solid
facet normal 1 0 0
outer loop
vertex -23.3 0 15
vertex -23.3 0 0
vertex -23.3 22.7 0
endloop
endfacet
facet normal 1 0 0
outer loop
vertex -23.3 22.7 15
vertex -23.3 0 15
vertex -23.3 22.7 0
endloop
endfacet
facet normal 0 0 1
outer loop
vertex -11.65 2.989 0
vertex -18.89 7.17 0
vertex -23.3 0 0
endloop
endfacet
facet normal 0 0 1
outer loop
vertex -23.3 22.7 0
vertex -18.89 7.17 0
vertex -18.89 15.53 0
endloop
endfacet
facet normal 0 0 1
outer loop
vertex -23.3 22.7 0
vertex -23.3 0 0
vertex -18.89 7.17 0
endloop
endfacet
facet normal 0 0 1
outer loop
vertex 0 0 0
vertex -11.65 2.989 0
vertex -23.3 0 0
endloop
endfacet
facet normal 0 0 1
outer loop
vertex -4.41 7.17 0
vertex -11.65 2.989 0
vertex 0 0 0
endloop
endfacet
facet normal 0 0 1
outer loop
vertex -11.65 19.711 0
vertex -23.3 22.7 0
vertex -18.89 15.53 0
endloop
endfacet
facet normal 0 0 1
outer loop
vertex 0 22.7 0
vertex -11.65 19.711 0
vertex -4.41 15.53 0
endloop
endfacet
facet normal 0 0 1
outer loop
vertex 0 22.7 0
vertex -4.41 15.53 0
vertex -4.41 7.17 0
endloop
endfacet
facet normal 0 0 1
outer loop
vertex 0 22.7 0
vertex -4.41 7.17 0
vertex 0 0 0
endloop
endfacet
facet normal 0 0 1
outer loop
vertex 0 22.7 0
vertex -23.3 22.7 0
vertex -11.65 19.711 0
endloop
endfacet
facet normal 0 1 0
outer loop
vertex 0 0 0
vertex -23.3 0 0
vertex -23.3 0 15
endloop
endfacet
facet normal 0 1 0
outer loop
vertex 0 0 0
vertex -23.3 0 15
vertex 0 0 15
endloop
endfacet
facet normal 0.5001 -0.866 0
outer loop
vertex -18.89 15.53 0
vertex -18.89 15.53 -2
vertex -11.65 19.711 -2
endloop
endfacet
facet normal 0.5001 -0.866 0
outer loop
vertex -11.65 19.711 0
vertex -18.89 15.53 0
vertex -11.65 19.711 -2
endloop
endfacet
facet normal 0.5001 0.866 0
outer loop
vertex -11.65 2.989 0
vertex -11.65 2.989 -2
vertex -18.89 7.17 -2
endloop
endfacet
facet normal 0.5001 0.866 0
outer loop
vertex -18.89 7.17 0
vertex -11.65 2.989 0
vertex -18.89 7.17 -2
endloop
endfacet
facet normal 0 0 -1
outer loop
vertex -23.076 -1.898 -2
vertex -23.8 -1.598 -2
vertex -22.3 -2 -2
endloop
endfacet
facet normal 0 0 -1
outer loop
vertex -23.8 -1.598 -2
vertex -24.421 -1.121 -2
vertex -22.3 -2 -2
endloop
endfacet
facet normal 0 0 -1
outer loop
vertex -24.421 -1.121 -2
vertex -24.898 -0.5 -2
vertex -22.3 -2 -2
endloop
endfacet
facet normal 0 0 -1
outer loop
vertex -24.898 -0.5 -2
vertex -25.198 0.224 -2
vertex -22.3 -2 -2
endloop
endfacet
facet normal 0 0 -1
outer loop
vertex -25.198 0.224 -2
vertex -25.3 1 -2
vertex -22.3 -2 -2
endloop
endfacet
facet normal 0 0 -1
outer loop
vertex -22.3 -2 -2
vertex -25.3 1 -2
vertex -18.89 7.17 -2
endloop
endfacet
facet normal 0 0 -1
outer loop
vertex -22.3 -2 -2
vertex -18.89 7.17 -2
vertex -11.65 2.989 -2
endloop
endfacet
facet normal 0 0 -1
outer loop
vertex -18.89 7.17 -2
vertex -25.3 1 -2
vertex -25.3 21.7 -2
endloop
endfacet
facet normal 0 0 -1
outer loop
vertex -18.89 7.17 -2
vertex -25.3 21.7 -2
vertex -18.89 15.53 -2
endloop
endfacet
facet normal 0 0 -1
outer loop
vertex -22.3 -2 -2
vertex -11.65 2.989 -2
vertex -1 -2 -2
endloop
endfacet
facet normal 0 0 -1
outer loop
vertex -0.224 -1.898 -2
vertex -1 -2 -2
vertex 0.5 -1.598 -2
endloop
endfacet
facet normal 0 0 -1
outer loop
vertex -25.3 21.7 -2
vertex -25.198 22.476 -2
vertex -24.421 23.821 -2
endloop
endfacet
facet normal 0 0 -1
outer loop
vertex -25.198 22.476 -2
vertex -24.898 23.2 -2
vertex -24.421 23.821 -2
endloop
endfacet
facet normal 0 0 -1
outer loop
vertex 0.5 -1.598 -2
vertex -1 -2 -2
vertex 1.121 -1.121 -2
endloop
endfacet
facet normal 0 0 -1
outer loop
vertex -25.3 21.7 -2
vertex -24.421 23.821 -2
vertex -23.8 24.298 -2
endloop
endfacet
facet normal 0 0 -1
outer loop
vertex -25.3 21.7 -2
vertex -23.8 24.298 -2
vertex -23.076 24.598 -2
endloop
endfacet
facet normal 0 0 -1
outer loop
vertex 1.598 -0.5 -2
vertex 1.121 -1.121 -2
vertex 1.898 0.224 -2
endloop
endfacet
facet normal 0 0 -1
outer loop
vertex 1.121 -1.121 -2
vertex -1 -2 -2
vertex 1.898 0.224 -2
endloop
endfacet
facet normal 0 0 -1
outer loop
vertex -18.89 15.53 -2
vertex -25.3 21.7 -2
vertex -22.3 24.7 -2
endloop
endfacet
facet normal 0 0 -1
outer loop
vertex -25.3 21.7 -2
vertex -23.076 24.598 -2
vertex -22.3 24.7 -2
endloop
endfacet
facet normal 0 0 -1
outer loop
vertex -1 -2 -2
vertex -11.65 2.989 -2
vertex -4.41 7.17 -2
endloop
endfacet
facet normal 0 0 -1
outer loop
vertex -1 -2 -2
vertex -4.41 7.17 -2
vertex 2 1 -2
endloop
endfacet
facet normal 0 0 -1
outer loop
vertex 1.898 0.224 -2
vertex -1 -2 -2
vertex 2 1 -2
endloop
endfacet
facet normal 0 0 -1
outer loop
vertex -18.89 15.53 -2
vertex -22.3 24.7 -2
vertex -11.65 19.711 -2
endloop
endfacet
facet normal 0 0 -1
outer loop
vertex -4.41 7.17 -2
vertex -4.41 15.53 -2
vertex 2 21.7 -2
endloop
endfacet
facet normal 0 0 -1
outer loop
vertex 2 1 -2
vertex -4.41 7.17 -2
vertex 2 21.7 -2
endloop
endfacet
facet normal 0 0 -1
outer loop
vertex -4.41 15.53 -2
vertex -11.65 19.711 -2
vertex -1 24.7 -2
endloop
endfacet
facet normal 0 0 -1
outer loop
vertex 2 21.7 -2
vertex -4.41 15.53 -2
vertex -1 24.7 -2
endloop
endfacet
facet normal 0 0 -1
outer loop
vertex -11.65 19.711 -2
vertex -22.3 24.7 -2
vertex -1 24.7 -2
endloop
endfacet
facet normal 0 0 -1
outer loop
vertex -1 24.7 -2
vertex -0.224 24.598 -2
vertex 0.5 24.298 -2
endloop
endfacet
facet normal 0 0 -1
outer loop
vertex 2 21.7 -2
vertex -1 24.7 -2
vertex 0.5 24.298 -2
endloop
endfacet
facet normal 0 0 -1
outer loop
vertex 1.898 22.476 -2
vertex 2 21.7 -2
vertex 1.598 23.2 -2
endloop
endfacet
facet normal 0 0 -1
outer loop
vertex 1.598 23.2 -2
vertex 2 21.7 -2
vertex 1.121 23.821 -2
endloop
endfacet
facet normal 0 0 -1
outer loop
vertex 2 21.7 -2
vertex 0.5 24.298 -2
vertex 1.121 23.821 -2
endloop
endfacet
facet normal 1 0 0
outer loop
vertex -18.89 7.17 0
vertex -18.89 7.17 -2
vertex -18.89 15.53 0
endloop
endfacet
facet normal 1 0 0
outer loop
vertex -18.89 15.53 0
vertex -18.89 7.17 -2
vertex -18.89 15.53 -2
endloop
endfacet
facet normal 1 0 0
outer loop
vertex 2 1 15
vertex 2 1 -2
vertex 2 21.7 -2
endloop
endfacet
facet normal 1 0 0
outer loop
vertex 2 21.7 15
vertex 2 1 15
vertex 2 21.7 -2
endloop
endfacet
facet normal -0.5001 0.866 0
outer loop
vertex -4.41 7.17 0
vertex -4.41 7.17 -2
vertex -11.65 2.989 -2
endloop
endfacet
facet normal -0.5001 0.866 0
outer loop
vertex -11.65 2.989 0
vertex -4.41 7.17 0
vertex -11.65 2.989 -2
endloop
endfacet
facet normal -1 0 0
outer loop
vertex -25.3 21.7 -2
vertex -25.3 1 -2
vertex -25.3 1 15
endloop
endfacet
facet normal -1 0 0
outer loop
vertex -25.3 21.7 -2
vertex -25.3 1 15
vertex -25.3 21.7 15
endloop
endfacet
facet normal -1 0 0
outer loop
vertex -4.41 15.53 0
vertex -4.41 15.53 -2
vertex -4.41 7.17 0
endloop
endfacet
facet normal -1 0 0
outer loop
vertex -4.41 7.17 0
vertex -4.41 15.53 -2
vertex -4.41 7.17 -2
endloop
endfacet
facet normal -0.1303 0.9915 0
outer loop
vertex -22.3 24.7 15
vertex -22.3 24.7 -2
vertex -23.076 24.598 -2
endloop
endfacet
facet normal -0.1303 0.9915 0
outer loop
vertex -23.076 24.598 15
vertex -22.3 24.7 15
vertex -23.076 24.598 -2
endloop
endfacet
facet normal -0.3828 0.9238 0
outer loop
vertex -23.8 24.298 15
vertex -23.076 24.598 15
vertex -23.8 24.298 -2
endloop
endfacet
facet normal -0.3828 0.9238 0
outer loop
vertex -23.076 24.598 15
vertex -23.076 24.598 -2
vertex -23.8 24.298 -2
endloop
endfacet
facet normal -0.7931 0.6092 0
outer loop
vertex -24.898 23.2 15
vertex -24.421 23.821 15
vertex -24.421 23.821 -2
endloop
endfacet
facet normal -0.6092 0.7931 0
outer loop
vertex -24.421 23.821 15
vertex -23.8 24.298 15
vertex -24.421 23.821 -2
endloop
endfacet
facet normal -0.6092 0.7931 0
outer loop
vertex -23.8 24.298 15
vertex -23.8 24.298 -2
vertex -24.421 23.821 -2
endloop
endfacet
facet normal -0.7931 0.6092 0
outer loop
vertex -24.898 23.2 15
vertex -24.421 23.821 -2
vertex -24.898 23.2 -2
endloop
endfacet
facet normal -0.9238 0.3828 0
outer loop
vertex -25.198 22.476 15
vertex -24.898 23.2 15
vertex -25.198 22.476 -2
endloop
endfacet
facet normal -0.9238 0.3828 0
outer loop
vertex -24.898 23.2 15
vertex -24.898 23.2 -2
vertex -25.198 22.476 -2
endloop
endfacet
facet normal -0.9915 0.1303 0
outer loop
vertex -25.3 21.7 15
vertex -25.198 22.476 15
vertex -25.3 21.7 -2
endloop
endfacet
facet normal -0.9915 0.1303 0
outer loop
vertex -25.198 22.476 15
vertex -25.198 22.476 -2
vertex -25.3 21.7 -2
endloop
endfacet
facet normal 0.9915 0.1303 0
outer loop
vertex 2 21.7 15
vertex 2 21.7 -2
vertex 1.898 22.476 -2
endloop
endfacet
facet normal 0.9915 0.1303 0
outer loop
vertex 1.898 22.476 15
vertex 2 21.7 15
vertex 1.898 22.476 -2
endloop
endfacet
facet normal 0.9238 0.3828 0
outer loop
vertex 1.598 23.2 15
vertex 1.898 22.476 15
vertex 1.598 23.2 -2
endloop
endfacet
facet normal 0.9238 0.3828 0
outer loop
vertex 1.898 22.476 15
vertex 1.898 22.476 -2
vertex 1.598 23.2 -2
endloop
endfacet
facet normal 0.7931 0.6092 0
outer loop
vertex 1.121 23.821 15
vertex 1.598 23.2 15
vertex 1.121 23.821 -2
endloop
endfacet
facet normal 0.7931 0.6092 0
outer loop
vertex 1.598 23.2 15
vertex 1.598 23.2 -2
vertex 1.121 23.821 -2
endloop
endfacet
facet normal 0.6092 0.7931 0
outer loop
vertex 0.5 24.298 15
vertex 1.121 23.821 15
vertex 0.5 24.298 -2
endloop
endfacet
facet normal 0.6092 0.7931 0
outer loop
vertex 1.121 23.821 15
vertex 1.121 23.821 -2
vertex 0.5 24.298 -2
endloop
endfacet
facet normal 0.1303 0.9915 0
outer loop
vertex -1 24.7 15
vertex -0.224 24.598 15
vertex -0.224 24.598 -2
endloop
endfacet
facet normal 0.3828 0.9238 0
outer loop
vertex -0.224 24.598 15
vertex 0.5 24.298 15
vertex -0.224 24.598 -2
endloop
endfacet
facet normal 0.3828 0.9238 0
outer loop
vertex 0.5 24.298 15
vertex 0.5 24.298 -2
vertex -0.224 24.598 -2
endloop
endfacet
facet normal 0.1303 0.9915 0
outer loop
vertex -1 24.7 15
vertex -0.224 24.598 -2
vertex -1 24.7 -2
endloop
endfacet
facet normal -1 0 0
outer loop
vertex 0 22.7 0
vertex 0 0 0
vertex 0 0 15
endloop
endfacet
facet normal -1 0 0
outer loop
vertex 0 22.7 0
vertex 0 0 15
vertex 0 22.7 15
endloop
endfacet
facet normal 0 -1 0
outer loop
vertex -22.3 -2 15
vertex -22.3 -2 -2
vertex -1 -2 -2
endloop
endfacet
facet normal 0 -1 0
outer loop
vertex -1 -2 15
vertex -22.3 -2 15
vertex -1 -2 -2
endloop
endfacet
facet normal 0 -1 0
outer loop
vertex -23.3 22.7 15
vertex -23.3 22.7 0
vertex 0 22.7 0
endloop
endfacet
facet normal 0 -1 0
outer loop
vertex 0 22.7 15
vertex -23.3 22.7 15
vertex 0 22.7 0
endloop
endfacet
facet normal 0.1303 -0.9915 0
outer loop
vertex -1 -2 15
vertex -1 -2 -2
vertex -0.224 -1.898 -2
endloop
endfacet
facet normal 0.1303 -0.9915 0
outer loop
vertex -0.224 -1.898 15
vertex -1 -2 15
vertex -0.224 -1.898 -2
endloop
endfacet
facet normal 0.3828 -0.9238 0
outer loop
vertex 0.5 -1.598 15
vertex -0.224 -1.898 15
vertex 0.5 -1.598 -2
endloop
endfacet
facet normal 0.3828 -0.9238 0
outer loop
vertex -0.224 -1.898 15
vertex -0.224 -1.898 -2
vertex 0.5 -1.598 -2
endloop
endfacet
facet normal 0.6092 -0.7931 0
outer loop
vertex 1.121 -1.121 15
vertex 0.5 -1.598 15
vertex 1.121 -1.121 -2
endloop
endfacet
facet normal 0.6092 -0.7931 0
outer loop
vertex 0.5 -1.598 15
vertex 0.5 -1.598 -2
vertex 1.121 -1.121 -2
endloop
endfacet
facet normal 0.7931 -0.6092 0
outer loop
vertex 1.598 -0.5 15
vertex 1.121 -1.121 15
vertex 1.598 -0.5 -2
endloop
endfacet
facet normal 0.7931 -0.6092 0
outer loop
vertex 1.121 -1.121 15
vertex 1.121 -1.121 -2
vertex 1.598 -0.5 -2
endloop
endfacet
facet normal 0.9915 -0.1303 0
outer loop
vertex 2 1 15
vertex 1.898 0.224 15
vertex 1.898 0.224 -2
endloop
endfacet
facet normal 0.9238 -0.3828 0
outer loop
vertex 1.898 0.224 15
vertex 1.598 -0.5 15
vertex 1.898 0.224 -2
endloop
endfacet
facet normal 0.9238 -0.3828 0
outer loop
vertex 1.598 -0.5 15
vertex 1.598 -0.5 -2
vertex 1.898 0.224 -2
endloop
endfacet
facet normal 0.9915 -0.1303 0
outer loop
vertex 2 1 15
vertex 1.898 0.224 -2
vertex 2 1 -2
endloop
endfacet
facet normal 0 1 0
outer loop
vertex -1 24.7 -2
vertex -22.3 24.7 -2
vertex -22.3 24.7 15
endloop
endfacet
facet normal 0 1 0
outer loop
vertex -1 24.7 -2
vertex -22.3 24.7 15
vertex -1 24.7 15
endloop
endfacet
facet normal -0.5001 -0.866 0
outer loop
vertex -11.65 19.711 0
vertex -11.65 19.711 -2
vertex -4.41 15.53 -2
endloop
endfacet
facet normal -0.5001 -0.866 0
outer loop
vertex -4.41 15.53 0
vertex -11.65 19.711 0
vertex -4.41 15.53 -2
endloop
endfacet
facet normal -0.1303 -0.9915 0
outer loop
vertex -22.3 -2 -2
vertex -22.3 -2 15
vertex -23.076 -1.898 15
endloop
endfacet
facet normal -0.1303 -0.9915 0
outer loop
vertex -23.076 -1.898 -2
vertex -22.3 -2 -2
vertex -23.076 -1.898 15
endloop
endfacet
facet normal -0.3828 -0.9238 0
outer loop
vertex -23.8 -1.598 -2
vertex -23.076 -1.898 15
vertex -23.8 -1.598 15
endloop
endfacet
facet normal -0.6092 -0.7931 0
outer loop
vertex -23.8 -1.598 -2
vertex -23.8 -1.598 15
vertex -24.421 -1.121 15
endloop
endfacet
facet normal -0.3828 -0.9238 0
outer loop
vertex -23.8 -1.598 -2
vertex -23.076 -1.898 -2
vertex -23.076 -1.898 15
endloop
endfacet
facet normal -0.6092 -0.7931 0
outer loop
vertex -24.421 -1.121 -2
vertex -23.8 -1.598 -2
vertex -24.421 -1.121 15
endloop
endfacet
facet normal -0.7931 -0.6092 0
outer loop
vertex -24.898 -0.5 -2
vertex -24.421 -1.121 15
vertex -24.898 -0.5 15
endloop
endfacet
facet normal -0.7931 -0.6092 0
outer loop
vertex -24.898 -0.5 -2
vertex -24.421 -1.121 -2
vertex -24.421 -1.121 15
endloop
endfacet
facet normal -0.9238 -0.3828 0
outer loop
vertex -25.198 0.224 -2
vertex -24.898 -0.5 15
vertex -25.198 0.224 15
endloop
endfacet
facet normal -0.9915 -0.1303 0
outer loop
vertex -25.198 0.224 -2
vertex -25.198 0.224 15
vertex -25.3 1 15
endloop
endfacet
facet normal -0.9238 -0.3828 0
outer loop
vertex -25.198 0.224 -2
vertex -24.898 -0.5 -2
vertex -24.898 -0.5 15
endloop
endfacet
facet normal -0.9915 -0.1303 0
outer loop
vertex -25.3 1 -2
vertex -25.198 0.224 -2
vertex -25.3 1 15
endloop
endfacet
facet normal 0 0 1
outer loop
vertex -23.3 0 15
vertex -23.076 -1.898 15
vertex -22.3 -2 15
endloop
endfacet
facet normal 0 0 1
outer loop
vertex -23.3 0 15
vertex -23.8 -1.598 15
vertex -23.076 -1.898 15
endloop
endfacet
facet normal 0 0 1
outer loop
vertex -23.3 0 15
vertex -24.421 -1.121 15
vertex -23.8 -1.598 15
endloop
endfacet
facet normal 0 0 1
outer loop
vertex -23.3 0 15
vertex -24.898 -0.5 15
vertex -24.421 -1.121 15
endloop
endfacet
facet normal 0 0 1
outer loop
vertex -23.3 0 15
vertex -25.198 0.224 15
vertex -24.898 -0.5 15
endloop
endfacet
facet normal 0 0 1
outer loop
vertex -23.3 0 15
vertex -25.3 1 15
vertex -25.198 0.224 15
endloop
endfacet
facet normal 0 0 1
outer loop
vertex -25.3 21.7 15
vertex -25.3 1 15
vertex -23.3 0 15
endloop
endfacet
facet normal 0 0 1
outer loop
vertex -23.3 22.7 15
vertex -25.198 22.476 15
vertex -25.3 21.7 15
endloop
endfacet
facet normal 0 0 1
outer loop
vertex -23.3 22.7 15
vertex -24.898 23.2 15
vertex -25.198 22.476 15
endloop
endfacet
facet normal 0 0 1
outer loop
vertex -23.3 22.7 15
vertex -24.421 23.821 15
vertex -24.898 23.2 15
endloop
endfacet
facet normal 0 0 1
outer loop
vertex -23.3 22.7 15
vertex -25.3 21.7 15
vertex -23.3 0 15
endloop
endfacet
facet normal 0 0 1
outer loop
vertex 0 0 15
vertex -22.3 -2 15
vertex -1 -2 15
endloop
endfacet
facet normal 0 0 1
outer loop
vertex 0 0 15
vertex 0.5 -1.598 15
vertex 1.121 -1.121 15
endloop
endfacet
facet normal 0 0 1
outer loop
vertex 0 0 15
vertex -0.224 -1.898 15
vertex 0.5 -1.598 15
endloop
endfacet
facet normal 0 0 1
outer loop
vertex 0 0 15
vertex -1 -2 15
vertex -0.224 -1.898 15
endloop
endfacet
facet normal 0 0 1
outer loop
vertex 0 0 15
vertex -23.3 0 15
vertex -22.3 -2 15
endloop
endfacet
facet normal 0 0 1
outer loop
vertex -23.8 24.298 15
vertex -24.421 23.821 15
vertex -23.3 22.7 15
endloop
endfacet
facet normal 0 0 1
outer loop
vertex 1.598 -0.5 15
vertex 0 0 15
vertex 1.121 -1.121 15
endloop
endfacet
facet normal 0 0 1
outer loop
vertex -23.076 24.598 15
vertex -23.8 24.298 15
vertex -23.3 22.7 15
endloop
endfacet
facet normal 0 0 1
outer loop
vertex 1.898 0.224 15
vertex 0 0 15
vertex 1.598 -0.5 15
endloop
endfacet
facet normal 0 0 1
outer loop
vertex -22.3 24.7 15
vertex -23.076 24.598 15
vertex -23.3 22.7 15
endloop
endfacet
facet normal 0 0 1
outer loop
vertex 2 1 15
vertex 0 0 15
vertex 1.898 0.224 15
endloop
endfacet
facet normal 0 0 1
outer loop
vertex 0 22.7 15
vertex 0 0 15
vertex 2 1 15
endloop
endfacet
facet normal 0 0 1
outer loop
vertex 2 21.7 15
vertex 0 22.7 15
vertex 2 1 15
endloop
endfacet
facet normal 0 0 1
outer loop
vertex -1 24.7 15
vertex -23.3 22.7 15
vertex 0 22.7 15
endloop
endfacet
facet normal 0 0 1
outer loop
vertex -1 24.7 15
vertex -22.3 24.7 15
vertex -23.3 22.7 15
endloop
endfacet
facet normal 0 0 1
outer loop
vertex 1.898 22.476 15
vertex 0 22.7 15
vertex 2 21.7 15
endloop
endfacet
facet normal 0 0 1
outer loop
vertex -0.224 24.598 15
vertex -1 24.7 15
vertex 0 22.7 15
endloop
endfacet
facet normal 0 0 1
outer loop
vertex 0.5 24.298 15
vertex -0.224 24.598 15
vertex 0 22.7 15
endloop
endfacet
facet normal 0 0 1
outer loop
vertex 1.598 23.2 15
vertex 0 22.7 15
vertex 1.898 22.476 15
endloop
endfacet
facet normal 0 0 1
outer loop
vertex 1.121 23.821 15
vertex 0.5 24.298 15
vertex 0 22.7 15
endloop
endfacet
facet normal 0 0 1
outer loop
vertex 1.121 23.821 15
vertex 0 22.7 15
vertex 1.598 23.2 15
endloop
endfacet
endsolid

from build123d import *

# Parameters (mm, degrees)
F0_W        = 23.3
F0_H        = 22.7
F1_DEPTH    = 15
F2_T        = 2
F3_T1_DEPTH = 32
F5_DEPTH    = 25


# Not quite as in the source:
# - a fillet or chamfer that OpenCascade refuses, or shapes differently, is made with other operations: its cross-section is extruded or revolved along the edge and cut away or added


with BuildPart() as f1:
    # F0 (on Top) → F1 (new body)
    with BuildSketch(Plane.XY):
        with Locations((-11.65, 11.35)):
            Rectangle(F0_W, F0_H)
    extrude(amount=F1_DEPTH)

    # F2
    f2_openings = [f1.faces().sort_by_distance(p)[0] for p in [
        (-11.65, 11.35, 15),
    ]]
    offset(amount=F2_T, openings=f2_openings, kind=Kind.INTERSECTION)

    # F3: fillet of radius 3 on 4 edges, made by hand

    # F3_s2 → F3_t1 (cut)
    with BuildSketch(Plane.XY.offset(-9.5)):
        with BuildLine():
            ThreePointArc((-22.3, -2), (-24.4213203436, -1.1213203436), (-25.3, 1))
            Line((-25.3, 1), (-25.3, -2))
            Line((-25.3, -2), (-22.3, -2))
        make_face()
        with BuildLine():
            ThreePointArc((-1, -2), (1.1213203436, -1.1213203436), (2, 1))
            Line((2, 1), (2, -2))
            Line((2, -2), (-1, -2))
        make_face()
        with BuildLine():
            ThreePointArc((2, 21.7), (1.1213203436, 23.8213203436), (-1, 24.7))
            Line((-1, 24.7), (2, 24.7))
            Line((2, 24.7), (2, 21.7))
        make_face()
        with BuildLine():
            ThreePointArc((-22.3, 24.7), (-24.4213203436, 23.8213203436), (-25.3, 21.7))
            Line((-25.3, 21.7), (-25.3, 24.7))
            Line((-25.3, 24.7), (-22.3, 24.7))
        make_face()
    extrude(amount=F3_T1_DEPTH, mode=Mode.SUBTRACT)

    # F4 (on face) → F5 (cut)
    with BuildSketch(Plane(origin=(0, 0, -2), x_dir=(1, 0, 0), z_dir=(0, 0, -1))):
        Polygon((-18.8904213403, -15.5302592099), (-11.65, -19.7105184197), (-4.4095786597, -15.5302592099), (-4.4095786597, -7.1697407901), (-11.65, -2.9894815803), (-18.8904213403, -7.1697407901), align=None)
    extrude(amount=-F5_DEPTH, mode=Mode.SUBTRACT)


solid = f1.part
